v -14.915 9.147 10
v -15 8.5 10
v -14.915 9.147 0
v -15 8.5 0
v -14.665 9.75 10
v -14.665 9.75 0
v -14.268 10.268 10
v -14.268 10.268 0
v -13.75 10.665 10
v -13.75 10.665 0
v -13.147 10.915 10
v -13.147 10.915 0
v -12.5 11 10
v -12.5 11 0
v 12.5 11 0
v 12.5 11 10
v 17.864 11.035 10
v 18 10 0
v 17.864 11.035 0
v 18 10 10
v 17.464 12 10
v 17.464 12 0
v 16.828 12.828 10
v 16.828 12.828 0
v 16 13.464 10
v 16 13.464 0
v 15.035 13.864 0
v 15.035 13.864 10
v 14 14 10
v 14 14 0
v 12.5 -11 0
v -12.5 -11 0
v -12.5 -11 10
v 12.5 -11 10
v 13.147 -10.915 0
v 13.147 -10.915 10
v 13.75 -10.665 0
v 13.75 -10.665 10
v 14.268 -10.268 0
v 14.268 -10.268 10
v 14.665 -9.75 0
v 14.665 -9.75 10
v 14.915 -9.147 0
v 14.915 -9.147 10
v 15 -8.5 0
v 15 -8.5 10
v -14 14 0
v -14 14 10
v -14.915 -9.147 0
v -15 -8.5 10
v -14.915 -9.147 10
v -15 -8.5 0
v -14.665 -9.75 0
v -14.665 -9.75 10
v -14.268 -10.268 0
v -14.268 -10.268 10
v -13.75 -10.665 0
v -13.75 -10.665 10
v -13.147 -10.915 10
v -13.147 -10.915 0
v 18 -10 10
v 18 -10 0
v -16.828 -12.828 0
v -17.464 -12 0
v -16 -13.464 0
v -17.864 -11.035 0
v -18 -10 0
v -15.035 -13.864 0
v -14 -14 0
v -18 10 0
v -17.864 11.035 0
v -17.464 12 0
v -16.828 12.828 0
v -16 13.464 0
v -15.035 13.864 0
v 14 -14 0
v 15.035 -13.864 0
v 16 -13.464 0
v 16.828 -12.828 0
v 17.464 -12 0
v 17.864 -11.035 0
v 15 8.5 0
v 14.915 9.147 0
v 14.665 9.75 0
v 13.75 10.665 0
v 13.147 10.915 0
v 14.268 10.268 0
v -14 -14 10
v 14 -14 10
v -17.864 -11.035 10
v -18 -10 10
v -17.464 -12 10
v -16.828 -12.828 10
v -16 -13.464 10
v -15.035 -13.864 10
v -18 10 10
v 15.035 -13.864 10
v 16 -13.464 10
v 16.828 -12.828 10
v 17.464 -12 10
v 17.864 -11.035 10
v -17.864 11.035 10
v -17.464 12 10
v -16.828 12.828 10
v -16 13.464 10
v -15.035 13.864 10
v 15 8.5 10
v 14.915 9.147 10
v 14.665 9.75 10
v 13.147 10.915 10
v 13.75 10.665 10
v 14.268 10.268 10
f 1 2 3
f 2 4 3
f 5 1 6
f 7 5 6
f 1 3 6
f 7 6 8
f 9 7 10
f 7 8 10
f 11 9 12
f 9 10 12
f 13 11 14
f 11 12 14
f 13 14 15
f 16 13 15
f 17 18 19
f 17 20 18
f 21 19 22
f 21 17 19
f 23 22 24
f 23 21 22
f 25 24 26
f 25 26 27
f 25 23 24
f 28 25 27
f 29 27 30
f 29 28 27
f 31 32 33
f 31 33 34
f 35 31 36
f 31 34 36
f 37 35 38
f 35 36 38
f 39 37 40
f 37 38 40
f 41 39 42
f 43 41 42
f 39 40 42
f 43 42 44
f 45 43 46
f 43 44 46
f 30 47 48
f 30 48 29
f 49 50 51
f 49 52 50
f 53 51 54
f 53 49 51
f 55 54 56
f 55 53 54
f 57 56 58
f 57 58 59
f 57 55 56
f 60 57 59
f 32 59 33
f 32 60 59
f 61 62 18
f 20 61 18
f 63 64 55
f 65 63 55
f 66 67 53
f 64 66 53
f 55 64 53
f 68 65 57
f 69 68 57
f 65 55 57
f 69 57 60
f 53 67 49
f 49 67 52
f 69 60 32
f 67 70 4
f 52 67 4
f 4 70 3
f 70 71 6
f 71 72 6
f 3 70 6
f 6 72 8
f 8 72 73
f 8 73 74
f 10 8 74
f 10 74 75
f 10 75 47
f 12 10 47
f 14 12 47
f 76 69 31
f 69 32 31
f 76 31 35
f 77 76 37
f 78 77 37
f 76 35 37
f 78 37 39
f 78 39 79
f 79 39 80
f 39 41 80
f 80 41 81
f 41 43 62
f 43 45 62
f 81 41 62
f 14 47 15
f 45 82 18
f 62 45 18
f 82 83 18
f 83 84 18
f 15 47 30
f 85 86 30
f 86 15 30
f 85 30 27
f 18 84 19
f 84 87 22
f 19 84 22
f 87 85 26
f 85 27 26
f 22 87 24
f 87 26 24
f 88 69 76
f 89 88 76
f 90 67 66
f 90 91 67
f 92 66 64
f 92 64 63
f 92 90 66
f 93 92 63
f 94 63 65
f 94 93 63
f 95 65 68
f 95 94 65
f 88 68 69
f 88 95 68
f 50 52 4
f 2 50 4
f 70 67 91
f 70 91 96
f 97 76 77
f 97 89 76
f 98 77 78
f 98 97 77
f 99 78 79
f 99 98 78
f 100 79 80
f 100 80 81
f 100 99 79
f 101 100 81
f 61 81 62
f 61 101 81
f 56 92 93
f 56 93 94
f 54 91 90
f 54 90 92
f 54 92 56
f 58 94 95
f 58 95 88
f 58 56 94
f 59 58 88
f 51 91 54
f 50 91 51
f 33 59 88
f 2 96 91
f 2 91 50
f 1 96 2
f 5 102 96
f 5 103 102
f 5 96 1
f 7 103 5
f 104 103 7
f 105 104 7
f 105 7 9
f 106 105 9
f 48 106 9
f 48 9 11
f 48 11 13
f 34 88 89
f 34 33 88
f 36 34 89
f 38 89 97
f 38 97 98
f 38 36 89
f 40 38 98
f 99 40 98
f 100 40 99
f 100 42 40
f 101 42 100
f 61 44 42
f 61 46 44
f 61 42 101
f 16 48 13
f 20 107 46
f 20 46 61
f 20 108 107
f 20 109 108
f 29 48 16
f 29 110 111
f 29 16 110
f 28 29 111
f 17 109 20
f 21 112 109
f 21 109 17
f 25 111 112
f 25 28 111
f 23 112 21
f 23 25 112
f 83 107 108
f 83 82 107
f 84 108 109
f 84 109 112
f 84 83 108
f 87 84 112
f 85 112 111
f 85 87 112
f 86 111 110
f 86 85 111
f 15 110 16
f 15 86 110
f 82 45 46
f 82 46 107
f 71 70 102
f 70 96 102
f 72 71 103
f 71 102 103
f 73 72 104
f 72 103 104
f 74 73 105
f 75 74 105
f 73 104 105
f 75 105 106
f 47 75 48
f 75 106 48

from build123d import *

# Parameters (mm, degrees)
F0_W     = 36
F0_H     = 28
F1_DEPTH = 10
F2_T     = -3
F3_R     = 2.5
F4_R     = 4


with BuildPart() as f1:
    # F0 (on Top) → F1 (new body)
    with BuildSketch(Plane.XY):
        Rectangle(F0_W, F0_H)
    extrude(amount=F1_DEPTH)

    # F2
    f2_openings = [f1.faces().sort_by_distance(p)[0] for p in [
        (0, 0, 10),
        (0, 0, 0),
    ]]
    offset(amount=F2_T, openings=f2_openings)

    # F3
    f3_edges = [f1.edges().sort_by_distance(p)[0] for p in [
        (-15, 11, 5),
        (15, 11, 5),
        (-15, -11, 5),
        (15, -11, 5),
    ]]
    fillet(f3_edges, radius=F3_R)

    # F4
    f4_edges = [f1.edges().sort_by_distance(p)[0] for p in [
        (-18, 14, 5),
        (18, 14, 5),
        (-18, -14, 5),
        (18, -14, 5),
    ]]
    fillet(f4_edges, radius=F4_R)


solid = f1.part
